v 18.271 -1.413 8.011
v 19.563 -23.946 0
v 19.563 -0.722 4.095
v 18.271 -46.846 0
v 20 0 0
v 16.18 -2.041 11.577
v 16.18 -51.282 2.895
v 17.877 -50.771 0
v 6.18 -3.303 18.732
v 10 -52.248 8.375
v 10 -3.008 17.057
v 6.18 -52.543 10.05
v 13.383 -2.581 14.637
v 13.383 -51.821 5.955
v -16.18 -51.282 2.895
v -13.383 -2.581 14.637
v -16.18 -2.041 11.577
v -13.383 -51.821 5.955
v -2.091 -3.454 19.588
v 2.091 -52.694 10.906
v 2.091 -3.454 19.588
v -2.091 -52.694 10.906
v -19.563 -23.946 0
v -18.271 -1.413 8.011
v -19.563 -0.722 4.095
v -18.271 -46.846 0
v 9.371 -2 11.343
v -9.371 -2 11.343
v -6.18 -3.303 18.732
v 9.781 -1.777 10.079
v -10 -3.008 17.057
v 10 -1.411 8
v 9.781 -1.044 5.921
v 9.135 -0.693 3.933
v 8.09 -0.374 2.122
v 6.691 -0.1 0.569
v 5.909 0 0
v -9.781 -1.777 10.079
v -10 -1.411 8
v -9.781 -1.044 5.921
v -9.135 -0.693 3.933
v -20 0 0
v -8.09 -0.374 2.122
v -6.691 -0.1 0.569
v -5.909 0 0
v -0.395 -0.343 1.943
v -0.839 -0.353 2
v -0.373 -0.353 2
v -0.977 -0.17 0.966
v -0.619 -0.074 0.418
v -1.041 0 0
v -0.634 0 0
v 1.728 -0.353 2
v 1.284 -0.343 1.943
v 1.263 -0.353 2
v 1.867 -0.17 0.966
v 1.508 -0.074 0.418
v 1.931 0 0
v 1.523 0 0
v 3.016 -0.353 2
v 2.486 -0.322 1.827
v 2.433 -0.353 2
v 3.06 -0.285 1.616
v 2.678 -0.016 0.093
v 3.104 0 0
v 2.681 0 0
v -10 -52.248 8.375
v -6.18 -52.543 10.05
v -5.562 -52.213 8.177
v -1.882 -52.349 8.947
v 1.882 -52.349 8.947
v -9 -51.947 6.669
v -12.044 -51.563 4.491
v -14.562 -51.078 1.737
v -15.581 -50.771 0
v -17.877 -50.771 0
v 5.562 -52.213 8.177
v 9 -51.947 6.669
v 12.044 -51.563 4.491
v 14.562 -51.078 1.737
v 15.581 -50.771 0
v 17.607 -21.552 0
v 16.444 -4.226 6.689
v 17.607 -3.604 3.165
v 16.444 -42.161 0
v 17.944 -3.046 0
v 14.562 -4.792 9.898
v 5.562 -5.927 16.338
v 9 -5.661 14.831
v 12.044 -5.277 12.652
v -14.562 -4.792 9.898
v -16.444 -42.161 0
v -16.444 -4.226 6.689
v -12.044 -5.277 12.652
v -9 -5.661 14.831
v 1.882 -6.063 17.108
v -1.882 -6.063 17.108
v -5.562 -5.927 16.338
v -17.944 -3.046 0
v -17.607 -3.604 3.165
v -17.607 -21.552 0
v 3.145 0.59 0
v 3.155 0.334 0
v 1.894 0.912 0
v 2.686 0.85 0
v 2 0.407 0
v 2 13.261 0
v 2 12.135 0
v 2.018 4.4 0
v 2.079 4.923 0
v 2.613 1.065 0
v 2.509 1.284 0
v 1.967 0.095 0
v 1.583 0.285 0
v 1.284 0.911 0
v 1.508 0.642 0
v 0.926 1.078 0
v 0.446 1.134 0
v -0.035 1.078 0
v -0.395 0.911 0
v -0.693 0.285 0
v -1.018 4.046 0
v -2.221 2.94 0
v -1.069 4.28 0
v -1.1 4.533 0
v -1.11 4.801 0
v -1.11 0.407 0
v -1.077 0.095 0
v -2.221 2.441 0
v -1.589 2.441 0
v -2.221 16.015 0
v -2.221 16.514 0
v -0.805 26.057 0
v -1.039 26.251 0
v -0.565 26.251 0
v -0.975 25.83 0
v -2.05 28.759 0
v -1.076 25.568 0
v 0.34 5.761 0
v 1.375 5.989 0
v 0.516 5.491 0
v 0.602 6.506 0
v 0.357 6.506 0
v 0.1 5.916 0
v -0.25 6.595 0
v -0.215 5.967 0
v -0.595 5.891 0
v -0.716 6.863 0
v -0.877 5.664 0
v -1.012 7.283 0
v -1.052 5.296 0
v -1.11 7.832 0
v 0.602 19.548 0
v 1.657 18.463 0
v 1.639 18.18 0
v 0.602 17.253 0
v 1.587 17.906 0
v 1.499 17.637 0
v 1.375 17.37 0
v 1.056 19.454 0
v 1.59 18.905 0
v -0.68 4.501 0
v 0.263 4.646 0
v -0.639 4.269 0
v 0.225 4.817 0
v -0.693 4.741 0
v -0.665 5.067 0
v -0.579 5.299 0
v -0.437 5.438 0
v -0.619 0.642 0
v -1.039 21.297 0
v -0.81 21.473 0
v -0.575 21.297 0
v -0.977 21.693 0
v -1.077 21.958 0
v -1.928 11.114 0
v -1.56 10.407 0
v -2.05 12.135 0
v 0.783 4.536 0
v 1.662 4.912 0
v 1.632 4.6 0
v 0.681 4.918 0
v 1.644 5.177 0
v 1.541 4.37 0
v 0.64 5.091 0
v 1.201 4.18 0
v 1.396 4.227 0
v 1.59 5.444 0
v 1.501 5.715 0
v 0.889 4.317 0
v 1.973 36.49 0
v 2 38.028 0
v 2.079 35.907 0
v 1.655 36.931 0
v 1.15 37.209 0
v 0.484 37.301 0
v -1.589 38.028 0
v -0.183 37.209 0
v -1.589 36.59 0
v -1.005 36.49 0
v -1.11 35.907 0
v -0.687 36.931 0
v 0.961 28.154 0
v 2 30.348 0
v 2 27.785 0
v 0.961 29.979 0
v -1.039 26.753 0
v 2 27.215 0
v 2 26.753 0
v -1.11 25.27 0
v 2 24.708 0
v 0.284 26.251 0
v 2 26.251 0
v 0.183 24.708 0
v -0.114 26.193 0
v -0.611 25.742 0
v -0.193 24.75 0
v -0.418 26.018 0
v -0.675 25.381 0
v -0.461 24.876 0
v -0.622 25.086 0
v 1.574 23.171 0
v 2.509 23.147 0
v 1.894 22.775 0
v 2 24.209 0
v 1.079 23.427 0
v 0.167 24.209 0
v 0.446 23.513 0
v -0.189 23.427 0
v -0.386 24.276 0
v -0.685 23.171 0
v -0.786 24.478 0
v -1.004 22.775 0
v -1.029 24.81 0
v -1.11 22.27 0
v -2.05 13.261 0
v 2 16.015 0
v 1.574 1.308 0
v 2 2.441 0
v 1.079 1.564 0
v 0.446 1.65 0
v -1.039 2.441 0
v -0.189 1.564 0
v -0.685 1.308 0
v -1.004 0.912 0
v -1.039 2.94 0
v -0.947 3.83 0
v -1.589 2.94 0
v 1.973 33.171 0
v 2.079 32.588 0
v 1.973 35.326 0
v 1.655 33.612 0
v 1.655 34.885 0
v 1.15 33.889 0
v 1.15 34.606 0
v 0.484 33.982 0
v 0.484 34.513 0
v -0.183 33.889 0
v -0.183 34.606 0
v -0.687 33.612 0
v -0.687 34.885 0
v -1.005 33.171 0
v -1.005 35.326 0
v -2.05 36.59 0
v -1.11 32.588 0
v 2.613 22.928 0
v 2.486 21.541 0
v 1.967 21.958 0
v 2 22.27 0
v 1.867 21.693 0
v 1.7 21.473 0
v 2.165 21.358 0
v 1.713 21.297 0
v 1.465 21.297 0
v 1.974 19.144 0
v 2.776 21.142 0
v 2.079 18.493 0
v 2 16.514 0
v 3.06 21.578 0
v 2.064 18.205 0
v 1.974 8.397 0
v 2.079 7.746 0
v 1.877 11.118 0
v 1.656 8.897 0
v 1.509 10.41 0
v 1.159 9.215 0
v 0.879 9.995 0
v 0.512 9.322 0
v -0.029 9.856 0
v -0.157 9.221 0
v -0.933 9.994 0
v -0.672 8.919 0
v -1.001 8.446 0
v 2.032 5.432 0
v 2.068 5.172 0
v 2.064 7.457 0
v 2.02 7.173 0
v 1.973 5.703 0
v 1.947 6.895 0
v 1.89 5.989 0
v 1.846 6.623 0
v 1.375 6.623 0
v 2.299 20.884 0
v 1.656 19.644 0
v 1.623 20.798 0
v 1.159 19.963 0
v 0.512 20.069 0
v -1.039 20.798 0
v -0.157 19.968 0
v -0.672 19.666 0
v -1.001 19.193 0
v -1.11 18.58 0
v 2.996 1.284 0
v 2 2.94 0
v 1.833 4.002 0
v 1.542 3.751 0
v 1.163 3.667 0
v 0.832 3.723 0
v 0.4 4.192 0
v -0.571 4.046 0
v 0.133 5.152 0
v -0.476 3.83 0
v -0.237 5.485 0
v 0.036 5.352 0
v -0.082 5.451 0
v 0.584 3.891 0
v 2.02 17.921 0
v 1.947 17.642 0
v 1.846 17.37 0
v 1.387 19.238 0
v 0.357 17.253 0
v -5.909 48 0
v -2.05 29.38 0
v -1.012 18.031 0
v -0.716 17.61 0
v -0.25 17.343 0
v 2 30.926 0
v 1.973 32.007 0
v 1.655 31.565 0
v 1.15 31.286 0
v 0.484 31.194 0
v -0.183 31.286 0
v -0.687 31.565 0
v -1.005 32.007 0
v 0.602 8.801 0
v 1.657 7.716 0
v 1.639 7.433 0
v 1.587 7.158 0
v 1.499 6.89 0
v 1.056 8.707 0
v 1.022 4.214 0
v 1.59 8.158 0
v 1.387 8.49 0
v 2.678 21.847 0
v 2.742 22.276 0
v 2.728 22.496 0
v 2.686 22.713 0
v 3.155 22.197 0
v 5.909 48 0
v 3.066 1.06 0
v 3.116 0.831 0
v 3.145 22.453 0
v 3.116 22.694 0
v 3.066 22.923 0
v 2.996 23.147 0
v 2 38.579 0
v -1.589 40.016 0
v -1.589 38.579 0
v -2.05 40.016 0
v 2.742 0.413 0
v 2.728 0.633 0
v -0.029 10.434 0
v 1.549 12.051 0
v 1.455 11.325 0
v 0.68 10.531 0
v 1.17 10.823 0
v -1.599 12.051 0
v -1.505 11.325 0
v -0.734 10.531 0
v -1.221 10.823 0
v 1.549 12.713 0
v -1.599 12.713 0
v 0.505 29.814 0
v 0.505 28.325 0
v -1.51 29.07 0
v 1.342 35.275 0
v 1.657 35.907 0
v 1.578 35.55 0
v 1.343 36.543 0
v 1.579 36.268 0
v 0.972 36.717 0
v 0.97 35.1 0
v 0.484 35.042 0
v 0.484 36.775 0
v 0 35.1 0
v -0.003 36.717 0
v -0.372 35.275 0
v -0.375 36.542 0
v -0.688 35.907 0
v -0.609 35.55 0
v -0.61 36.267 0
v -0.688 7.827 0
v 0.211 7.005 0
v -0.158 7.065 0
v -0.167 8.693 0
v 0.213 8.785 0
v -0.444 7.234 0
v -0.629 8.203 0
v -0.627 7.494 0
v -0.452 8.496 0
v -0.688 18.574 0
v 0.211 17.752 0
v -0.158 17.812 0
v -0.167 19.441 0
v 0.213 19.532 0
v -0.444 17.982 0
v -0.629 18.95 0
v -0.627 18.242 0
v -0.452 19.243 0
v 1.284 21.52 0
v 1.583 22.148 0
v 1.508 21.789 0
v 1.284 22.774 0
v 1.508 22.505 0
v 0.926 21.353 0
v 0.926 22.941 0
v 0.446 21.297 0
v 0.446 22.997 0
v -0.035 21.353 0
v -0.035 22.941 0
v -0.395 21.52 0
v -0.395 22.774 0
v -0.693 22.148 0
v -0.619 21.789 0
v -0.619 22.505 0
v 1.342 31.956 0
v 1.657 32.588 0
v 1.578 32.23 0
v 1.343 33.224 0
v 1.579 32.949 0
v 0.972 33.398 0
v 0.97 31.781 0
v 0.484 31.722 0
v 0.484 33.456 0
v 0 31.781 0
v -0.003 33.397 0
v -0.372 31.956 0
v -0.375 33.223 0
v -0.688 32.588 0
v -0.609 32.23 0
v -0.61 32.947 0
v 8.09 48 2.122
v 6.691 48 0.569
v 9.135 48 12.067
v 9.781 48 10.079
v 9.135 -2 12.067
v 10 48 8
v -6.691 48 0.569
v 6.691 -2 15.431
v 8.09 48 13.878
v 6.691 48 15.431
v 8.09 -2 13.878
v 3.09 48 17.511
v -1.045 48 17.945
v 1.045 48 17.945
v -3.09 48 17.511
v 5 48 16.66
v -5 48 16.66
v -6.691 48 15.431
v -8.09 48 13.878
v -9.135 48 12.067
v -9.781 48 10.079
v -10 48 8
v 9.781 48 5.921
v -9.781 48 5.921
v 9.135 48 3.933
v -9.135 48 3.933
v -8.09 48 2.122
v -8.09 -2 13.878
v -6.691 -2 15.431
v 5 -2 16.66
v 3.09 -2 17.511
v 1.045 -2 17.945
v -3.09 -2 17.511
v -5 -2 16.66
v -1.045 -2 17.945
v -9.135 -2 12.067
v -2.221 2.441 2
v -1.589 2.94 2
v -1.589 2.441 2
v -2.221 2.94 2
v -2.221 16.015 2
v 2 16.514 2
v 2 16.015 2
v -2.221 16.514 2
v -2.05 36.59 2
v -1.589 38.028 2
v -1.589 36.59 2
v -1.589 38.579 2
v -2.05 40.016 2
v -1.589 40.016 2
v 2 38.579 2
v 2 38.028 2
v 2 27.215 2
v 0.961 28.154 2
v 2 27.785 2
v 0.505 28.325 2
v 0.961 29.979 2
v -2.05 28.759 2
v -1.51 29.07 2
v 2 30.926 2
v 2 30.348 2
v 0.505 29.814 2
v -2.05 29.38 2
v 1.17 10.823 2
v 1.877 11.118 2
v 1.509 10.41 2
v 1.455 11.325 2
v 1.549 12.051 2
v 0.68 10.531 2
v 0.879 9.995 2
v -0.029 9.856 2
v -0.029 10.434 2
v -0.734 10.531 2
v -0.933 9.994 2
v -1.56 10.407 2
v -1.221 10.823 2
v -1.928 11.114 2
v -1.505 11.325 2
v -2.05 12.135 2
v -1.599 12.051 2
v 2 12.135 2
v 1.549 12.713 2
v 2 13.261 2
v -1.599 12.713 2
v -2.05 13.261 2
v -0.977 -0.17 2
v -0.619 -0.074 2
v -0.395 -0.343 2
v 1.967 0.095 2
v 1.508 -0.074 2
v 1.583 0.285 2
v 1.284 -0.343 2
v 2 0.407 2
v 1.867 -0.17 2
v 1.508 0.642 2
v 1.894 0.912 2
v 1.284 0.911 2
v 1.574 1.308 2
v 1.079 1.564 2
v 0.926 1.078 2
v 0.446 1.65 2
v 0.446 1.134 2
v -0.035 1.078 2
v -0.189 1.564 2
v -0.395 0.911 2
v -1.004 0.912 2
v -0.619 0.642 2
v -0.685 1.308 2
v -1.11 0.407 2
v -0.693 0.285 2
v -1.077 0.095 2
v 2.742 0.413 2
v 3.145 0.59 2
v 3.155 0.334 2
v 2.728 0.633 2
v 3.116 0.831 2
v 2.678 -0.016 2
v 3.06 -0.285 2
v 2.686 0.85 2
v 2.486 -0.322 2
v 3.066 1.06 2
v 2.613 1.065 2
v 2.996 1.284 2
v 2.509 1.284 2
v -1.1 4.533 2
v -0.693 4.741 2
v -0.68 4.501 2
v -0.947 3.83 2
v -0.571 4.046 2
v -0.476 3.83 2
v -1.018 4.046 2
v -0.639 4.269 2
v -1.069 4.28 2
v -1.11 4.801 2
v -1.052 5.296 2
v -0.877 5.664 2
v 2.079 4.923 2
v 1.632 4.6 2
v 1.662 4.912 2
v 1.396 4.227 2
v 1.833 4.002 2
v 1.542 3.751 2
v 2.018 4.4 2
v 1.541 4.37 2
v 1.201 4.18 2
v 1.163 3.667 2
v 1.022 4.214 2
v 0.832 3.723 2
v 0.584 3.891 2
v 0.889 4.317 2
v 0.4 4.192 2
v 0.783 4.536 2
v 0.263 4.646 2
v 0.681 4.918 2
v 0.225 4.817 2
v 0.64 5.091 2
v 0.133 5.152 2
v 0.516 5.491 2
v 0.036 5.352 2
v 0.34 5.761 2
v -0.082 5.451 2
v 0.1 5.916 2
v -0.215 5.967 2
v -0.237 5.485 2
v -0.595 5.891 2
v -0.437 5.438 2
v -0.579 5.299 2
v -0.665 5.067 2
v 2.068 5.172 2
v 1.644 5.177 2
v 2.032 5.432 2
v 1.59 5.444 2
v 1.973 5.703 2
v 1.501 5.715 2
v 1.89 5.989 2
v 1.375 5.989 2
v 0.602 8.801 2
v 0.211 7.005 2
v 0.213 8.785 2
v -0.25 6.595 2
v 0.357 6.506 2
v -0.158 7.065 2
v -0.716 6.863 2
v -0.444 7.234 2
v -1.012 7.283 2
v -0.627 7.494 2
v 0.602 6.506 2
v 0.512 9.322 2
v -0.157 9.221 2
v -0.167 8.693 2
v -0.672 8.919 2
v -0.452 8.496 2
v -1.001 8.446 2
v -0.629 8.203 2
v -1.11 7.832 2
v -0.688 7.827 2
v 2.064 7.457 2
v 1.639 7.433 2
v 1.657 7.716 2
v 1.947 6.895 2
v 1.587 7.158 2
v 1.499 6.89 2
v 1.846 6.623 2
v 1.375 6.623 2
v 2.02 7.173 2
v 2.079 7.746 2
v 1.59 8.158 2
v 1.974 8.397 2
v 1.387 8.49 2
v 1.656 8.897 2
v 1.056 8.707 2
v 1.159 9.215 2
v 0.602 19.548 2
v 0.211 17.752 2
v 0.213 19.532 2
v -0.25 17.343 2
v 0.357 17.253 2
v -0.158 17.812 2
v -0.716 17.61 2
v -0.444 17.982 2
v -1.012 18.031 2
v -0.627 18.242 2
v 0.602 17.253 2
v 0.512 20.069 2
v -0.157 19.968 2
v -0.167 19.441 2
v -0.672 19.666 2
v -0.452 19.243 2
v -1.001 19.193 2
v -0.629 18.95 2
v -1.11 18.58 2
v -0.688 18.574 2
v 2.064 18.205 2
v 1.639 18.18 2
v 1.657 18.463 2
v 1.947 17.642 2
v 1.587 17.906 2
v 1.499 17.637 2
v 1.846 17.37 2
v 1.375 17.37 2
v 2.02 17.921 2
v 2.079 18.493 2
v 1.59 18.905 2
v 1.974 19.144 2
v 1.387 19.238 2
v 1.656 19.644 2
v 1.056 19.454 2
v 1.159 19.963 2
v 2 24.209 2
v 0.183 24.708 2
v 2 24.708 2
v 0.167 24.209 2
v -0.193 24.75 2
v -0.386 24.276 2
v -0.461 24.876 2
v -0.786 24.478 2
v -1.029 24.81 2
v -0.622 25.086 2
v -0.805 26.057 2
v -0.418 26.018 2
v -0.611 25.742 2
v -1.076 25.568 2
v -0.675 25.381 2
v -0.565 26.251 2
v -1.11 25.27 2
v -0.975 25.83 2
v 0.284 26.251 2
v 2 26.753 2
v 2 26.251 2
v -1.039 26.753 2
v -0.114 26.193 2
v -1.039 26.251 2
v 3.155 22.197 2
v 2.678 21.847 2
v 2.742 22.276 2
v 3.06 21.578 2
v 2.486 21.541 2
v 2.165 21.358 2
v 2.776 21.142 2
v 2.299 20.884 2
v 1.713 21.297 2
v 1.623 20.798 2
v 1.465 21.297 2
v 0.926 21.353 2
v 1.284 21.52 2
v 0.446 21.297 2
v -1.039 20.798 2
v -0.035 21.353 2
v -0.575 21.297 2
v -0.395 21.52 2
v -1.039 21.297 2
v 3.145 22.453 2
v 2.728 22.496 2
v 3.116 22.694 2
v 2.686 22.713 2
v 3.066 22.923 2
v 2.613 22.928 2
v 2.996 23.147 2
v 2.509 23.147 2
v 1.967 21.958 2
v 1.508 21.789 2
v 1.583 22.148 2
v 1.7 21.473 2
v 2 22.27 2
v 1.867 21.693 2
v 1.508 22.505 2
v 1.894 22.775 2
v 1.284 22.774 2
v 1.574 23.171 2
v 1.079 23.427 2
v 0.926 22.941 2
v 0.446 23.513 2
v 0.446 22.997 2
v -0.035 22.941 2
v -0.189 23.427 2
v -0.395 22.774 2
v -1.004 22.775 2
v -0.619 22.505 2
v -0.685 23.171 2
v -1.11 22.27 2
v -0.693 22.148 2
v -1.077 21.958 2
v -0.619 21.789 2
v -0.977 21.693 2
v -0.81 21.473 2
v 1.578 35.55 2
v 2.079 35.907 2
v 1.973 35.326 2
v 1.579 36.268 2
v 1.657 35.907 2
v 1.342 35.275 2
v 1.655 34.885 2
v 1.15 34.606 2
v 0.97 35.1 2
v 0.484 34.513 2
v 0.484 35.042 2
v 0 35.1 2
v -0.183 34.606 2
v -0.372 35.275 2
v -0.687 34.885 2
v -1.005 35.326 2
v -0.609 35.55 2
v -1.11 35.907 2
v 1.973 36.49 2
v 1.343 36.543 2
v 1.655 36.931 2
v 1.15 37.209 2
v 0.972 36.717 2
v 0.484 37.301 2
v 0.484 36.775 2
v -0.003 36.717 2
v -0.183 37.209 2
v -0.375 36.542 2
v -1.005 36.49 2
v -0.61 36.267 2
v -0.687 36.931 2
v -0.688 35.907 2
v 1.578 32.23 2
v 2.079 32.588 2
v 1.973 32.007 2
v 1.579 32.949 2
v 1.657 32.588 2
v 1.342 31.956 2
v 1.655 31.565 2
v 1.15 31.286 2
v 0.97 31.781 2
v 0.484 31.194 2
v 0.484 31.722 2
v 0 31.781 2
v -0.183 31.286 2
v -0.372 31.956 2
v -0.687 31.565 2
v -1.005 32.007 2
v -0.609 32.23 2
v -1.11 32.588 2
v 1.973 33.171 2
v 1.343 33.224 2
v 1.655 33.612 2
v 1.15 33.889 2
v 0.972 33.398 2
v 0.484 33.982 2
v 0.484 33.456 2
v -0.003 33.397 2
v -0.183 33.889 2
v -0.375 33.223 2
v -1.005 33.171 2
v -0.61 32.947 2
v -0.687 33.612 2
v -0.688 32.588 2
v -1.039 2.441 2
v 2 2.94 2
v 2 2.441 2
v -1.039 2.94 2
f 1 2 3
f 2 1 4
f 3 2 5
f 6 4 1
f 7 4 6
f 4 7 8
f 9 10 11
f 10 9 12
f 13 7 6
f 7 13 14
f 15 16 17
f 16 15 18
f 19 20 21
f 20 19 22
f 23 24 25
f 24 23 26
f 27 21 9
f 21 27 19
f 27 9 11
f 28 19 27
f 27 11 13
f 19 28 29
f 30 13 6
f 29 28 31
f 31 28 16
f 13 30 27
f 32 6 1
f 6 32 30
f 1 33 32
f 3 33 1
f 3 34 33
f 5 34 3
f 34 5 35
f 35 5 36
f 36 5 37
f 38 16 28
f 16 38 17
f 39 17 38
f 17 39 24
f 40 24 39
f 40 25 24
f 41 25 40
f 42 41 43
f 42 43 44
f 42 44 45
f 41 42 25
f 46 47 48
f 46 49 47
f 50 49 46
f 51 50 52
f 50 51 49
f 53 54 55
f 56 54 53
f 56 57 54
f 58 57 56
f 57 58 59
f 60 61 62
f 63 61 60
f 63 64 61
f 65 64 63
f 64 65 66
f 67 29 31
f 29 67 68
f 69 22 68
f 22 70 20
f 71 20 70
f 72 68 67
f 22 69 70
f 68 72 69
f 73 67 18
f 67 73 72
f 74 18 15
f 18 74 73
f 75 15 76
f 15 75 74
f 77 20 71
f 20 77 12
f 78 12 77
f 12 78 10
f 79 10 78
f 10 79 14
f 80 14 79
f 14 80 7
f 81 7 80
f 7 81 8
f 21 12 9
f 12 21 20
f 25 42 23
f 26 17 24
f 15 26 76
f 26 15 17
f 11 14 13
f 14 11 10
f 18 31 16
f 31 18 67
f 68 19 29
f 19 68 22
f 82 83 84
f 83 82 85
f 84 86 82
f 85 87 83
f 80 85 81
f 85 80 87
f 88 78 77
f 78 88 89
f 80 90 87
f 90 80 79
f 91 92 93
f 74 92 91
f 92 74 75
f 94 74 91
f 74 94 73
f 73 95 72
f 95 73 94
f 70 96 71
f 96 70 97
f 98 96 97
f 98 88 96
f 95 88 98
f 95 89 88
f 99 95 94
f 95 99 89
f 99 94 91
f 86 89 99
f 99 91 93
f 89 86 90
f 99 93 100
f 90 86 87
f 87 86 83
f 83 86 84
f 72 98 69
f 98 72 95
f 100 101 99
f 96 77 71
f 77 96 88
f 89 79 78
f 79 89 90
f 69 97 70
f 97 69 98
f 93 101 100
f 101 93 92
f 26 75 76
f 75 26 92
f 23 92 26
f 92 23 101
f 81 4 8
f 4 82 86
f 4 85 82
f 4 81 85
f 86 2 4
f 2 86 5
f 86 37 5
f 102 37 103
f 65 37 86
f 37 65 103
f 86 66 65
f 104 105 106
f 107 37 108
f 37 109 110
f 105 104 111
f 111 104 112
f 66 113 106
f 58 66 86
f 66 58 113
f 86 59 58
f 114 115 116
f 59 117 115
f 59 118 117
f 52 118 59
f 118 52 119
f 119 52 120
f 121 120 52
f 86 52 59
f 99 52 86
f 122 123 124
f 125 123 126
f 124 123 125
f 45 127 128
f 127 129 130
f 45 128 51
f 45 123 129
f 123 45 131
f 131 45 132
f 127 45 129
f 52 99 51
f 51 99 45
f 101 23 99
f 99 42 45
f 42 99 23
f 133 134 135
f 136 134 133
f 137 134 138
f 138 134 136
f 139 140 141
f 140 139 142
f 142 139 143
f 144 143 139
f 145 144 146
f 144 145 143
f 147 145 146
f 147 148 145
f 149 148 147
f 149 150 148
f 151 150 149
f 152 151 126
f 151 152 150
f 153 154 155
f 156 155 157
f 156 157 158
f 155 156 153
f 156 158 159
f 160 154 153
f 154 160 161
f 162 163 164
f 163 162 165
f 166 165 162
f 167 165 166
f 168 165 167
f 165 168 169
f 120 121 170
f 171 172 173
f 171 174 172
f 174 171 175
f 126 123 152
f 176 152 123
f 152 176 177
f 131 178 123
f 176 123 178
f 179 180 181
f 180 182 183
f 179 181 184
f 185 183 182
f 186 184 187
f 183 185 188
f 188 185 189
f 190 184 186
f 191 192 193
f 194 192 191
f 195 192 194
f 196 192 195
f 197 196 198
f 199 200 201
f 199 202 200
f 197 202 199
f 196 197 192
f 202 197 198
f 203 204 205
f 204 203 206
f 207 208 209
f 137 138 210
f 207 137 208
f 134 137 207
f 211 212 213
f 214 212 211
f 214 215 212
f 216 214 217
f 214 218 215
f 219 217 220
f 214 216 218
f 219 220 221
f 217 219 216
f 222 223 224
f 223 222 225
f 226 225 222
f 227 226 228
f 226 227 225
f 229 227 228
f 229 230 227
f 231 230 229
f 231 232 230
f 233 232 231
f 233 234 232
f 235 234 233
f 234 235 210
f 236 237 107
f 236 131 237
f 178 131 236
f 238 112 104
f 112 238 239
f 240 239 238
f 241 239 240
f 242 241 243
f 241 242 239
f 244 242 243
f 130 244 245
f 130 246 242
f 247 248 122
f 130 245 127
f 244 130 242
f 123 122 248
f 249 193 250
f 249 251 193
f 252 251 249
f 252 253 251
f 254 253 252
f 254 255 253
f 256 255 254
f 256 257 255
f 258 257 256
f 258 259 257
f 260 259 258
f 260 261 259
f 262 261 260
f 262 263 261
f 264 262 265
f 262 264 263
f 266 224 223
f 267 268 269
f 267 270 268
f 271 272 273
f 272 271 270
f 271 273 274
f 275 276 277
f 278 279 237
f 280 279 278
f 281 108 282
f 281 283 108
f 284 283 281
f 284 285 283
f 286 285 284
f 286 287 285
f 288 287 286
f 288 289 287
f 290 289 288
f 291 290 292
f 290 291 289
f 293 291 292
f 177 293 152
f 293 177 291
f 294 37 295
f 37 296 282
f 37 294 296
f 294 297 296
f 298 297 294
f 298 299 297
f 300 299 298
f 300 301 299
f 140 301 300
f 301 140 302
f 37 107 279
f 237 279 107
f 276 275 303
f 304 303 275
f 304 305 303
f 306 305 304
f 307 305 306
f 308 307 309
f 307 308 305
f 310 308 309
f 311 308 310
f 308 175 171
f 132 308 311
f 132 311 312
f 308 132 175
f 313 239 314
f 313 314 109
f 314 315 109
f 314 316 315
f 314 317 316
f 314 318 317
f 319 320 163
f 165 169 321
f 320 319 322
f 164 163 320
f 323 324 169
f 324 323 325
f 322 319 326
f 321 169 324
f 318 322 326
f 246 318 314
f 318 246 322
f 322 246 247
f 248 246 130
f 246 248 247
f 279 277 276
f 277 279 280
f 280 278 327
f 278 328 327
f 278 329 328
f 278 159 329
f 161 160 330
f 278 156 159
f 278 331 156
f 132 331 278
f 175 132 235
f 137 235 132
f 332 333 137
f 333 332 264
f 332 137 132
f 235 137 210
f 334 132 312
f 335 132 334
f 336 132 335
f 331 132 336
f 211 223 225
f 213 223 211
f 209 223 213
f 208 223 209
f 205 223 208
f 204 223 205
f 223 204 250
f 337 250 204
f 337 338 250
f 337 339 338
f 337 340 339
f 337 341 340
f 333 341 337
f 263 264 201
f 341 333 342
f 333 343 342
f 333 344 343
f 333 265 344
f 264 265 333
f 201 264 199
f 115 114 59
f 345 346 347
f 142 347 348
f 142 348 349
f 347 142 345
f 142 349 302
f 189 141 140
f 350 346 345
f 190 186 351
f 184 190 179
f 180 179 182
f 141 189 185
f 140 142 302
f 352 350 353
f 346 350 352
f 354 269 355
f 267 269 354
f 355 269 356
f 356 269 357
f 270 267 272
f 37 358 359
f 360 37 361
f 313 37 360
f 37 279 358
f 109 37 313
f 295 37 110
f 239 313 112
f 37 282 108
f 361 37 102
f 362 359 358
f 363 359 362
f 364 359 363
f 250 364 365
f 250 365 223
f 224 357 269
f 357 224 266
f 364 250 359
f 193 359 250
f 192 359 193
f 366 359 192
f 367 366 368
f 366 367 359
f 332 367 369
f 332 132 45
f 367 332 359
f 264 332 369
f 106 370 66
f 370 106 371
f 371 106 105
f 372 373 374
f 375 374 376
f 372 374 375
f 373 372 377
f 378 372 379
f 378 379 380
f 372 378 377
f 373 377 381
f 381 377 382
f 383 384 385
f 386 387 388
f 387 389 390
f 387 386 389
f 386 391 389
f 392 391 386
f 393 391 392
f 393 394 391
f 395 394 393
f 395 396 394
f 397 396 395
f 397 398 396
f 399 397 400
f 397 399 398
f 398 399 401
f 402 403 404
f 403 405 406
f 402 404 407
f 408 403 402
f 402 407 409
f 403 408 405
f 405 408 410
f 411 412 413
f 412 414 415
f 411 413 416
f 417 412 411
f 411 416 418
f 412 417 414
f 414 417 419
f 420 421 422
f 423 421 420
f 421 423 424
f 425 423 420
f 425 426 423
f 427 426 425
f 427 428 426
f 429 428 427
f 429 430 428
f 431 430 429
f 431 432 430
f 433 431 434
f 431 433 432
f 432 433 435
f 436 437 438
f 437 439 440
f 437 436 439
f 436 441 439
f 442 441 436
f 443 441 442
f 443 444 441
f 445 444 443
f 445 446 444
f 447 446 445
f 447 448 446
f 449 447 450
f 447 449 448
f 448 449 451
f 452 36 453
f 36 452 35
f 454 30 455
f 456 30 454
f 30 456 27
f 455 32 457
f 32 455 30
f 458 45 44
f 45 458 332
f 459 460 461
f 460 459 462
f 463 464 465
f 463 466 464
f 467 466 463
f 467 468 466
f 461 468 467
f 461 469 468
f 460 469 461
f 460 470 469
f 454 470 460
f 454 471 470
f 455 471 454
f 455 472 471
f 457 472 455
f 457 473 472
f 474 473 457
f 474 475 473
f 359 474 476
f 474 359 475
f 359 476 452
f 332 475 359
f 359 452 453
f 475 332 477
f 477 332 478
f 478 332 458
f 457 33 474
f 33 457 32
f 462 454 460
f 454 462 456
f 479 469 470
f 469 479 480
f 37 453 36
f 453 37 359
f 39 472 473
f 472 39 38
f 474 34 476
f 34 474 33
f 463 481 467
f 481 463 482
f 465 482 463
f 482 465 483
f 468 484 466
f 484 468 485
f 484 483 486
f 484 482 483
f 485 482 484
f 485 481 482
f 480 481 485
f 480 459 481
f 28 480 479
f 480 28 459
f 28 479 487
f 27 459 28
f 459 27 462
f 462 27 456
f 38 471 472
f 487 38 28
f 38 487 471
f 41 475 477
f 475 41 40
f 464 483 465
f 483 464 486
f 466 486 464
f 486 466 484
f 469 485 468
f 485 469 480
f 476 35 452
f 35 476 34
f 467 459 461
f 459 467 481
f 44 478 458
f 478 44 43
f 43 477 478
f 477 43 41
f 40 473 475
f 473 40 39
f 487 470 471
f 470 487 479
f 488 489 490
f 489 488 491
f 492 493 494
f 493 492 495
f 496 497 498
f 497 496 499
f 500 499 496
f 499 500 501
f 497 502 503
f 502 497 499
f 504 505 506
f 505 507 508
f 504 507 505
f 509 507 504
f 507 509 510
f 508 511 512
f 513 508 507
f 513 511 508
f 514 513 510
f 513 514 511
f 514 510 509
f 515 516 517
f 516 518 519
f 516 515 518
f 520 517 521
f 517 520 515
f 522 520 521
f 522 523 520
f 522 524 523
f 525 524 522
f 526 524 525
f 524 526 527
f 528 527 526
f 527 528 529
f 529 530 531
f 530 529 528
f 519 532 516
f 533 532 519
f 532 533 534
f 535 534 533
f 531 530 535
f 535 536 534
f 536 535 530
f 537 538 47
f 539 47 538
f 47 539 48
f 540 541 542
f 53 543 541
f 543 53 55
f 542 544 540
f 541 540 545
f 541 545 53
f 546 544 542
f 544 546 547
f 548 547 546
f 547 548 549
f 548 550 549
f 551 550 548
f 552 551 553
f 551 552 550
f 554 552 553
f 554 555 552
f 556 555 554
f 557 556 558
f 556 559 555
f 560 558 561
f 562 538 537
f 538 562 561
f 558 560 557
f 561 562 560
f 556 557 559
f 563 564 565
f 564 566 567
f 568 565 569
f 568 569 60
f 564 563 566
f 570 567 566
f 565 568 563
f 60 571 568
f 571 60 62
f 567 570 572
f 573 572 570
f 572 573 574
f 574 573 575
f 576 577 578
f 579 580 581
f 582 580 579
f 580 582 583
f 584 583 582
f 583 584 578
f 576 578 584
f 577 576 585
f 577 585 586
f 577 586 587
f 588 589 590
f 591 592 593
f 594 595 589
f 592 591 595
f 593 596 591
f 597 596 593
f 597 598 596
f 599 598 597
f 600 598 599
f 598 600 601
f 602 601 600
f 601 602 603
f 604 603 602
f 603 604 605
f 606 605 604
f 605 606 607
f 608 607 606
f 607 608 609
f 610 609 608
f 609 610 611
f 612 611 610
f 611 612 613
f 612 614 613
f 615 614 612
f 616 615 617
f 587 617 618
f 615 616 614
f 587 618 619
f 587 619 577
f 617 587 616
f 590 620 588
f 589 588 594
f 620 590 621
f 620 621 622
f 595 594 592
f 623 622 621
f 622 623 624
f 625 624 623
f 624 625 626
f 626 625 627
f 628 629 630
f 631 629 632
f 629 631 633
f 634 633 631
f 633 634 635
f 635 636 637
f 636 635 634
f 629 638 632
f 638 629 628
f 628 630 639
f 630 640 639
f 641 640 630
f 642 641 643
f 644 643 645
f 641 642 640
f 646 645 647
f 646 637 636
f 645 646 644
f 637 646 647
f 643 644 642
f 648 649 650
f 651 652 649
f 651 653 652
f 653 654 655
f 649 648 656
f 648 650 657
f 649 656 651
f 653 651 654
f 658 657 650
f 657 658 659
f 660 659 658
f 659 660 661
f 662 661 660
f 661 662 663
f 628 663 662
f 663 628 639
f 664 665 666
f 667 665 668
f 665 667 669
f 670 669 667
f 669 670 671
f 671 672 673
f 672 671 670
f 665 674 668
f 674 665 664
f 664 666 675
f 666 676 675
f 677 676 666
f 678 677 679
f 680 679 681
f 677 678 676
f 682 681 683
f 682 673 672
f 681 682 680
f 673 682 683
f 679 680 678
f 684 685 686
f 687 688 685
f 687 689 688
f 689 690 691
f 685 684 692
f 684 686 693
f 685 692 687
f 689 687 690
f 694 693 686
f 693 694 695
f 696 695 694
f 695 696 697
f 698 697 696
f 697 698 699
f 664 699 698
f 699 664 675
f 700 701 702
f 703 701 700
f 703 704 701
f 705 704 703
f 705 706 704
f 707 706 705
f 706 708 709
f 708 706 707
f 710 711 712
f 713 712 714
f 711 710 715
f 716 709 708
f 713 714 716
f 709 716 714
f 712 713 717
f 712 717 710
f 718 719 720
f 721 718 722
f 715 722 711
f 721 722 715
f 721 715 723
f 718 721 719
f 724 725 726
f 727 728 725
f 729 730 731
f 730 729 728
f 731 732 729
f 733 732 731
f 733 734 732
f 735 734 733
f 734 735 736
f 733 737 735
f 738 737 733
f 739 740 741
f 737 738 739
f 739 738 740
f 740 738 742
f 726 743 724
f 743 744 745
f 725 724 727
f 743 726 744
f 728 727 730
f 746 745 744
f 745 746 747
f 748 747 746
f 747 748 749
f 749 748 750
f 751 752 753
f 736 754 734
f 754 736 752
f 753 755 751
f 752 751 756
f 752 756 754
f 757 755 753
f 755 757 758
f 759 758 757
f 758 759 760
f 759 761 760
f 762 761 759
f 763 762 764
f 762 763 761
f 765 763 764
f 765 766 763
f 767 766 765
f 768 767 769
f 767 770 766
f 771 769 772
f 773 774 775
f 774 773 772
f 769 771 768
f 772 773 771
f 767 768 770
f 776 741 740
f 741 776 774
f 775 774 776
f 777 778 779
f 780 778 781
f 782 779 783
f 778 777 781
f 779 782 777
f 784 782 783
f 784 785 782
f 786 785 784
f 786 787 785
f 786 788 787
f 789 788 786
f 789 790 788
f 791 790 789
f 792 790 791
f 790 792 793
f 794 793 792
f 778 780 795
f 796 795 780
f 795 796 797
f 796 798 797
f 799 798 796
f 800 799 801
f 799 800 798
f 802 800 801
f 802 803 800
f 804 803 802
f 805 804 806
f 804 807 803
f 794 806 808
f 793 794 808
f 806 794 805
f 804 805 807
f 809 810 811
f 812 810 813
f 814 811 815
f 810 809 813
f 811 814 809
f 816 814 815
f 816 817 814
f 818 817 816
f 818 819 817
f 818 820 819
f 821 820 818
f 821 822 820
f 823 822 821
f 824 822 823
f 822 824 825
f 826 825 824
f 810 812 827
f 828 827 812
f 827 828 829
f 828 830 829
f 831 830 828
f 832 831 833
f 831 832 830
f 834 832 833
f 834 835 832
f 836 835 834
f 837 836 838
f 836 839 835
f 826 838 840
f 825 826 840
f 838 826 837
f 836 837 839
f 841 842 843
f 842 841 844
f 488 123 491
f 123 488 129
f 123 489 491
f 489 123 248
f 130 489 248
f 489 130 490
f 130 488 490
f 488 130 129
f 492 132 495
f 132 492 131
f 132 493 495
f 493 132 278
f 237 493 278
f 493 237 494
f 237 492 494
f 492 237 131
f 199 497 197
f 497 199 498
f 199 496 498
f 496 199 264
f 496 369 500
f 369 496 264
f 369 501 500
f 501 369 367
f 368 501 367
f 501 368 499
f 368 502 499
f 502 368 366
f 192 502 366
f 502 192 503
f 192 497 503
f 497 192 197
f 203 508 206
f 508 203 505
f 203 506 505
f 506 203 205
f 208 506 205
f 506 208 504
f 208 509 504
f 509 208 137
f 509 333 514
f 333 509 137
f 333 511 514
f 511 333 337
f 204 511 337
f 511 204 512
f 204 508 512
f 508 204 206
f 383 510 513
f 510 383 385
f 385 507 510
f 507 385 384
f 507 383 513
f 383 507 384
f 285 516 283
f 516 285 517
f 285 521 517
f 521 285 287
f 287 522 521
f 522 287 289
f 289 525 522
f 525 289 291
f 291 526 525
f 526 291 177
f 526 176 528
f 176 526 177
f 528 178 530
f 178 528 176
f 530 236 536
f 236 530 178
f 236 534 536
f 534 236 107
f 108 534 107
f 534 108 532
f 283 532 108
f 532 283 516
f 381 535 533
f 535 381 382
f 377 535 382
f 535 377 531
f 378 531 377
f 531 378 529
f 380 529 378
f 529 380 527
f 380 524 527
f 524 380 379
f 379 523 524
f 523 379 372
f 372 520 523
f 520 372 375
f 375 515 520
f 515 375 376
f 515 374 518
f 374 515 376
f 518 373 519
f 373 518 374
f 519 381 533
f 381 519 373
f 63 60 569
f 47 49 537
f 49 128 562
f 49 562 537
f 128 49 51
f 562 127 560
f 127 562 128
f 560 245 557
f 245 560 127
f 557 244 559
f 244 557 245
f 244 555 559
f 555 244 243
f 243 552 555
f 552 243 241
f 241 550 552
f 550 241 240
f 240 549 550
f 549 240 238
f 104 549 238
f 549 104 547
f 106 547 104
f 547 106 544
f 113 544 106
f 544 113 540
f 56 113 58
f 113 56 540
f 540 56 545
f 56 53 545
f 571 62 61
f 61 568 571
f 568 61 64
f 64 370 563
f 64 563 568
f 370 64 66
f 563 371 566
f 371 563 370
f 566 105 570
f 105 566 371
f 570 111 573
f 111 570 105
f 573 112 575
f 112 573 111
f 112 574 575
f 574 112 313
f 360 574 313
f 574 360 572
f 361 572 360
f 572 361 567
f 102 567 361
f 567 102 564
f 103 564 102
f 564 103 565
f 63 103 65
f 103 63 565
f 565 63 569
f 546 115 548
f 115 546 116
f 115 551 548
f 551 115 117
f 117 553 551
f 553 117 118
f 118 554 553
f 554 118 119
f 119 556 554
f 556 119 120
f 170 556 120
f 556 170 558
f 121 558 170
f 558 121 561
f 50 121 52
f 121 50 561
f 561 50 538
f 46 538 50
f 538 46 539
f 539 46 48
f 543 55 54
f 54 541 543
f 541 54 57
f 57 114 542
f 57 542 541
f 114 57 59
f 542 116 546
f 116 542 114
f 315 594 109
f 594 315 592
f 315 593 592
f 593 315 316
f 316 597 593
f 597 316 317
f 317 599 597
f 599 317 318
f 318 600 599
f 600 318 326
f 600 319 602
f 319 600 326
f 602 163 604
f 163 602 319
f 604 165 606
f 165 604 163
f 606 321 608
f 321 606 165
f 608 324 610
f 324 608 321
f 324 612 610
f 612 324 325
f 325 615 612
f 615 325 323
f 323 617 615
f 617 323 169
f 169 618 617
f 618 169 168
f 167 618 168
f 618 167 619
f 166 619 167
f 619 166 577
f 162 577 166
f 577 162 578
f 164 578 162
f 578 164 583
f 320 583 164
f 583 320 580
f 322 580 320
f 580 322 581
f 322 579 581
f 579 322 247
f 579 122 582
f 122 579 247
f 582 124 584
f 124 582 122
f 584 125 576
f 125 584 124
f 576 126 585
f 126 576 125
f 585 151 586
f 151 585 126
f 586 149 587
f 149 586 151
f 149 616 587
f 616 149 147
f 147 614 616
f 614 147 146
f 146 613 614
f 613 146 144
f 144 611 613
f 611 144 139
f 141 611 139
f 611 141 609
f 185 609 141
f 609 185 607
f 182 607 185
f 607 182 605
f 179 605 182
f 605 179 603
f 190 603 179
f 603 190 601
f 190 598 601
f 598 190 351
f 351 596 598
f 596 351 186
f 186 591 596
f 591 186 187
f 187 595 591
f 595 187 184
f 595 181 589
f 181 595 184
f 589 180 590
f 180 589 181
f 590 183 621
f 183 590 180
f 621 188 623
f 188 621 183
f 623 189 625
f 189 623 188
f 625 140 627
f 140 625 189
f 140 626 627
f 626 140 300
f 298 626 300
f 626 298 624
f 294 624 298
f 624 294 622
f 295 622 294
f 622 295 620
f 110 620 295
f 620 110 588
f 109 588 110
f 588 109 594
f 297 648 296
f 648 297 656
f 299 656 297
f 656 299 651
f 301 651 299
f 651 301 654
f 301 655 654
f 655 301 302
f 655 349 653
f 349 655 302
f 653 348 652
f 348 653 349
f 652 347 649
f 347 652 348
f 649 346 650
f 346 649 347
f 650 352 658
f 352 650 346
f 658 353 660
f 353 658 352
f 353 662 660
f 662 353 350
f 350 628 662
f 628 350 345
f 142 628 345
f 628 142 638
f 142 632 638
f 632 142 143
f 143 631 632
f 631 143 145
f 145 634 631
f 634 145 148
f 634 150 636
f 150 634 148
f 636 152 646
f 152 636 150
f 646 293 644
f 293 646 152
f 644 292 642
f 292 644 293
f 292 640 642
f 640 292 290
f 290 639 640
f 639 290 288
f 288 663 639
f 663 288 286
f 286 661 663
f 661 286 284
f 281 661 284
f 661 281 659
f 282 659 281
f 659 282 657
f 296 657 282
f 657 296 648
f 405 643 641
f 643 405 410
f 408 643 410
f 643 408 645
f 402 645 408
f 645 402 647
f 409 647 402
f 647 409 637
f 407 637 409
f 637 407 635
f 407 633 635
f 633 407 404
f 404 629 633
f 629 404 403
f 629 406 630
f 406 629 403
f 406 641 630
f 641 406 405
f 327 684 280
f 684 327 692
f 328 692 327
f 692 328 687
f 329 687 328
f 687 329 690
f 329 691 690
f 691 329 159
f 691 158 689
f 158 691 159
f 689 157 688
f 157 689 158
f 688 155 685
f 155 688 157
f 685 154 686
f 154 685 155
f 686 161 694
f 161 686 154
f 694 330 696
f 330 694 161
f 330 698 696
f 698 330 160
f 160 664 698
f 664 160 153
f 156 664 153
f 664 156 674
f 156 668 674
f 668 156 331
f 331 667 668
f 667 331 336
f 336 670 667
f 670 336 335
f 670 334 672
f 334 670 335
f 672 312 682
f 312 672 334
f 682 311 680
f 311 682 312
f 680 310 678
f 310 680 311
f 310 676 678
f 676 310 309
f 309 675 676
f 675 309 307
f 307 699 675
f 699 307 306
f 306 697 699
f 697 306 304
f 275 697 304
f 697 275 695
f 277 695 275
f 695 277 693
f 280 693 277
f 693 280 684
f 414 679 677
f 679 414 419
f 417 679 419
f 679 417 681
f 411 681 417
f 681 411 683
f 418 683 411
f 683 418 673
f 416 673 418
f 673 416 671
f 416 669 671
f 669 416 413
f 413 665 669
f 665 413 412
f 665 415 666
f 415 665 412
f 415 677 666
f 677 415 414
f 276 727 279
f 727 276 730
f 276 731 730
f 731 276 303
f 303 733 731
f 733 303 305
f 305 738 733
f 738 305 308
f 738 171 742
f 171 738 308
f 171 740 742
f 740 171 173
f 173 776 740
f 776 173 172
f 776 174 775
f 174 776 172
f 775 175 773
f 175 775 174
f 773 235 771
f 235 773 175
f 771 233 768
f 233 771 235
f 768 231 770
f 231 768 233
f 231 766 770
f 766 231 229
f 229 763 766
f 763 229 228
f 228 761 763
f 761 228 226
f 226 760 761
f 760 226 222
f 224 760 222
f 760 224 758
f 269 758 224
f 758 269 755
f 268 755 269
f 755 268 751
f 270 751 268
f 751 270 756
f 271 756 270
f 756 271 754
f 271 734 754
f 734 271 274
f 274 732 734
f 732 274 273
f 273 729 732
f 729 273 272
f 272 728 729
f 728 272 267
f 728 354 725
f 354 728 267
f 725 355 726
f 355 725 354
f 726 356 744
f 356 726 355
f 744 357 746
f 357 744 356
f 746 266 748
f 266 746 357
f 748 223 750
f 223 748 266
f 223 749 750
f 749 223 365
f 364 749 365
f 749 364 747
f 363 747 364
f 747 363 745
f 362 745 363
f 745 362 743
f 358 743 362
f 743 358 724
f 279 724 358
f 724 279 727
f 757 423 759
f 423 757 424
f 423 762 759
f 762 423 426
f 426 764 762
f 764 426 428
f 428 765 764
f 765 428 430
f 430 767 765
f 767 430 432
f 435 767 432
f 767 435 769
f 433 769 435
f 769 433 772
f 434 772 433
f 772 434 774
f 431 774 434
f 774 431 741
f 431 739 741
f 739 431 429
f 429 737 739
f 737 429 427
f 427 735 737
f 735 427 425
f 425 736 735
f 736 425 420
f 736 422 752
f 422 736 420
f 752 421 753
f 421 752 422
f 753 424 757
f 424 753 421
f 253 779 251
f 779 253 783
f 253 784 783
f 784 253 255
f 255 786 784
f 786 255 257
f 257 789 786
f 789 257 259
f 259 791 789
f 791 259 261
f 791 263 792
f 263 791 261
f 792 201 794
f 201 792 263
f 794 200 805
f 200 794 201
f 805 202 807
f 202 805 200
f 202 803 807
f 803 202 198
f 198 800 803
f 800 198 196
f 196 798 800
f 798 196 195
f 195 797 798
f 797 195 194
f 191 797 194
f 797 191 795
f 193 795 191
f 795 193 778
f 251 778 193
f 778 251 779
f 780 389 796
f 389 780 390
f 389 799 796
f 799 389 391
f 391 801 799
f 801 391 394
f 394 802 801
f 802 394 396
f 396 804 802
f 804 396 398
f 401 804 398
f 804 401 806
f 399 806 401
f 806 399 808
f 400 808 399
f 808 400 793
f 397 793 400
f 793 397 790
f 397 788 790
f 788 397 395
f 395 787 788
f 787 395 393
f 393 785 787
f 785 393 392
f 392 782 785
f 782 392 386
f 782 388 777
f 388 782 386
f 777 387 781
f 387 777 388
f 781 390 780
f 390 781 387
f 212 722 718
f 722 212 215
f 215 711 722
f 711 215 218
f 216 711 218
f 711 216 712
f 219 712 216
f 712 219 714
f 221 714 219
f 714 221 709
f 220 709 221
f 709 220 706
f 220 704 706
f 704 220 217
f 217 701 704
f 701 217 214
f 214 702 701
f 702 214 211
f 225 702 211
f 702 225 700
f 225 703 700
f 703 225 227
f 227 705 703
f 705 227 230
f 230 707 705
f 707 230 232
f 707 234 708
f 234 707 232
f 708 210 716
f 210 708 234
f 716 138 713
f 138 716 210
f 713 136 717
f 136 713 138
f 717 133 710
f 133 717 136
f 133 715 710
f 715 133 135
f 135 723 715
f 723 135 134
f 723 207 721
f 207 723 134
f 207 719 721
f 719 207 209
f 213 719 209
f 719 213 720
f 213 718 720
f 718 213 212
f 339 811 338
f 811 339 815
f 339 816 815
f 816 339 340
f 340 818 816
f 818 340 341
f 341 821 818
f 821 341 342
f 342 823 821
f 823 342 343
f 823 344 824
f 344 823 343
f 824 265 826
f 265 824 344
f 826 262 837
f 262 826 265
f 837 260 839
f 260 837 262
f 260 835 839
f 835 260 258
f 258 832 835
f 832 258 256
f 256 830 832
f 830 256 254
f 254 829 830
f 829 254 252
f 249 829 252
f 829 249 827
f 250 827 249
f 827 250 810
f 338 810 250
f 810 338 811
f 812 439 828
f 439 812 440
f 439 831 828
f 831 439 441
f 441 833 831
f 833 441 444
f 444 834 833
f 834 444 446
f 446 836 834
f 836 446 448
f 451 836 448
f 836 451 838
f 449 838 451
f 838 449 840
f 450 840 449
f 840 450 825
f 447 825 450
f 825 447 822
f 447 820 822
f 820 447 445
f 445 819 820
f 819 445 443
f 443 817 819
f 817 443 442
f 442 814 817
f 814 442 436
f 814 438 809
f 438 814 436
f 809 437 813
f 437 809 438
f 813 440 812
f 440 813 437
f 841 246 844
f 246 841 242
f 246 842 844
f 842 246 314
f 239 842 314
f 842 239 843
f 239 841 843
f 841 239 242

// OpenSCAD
frontRadius=20;
thickness=2;
frontLength=50;

backRadius=10;
backLength=50;

cutBottomPlate = 500;

difference() {
    rotate([100, 0, 0]) {
        difference() {
            cylinder(frontLength, r=frontRadius);
            translate([0, 0, thickness + 1]) cylinder(frontLength-thickness, r=frontRadius-thickness);
        }
    }
    translate([-cutBottomPlate / 2, -cutBottomPlate / 2, -cutBottomPlate]) cube(cutBottomPlate, cutBottomPlate, cutBottomPlate);
}

difference() {
    translate([0, backLength-thickness, backRadius-thickness]) rotate([90, 0, 0]) cylinder(backLength, r=backRadius);
    translate([-cutBottomPlate / 2, -cutBottomPlate / 2, -cutBottomPlate]) cube(cutBottomPlate, cutBottomPlate, cutBottomPlate);
    translate([2, 40, thickness]) rotate([0, 180,  90]) linear_extrude(thickness) text("TooAngel Design", size=4, font="Deftone Stylus:style=Regular");
}
